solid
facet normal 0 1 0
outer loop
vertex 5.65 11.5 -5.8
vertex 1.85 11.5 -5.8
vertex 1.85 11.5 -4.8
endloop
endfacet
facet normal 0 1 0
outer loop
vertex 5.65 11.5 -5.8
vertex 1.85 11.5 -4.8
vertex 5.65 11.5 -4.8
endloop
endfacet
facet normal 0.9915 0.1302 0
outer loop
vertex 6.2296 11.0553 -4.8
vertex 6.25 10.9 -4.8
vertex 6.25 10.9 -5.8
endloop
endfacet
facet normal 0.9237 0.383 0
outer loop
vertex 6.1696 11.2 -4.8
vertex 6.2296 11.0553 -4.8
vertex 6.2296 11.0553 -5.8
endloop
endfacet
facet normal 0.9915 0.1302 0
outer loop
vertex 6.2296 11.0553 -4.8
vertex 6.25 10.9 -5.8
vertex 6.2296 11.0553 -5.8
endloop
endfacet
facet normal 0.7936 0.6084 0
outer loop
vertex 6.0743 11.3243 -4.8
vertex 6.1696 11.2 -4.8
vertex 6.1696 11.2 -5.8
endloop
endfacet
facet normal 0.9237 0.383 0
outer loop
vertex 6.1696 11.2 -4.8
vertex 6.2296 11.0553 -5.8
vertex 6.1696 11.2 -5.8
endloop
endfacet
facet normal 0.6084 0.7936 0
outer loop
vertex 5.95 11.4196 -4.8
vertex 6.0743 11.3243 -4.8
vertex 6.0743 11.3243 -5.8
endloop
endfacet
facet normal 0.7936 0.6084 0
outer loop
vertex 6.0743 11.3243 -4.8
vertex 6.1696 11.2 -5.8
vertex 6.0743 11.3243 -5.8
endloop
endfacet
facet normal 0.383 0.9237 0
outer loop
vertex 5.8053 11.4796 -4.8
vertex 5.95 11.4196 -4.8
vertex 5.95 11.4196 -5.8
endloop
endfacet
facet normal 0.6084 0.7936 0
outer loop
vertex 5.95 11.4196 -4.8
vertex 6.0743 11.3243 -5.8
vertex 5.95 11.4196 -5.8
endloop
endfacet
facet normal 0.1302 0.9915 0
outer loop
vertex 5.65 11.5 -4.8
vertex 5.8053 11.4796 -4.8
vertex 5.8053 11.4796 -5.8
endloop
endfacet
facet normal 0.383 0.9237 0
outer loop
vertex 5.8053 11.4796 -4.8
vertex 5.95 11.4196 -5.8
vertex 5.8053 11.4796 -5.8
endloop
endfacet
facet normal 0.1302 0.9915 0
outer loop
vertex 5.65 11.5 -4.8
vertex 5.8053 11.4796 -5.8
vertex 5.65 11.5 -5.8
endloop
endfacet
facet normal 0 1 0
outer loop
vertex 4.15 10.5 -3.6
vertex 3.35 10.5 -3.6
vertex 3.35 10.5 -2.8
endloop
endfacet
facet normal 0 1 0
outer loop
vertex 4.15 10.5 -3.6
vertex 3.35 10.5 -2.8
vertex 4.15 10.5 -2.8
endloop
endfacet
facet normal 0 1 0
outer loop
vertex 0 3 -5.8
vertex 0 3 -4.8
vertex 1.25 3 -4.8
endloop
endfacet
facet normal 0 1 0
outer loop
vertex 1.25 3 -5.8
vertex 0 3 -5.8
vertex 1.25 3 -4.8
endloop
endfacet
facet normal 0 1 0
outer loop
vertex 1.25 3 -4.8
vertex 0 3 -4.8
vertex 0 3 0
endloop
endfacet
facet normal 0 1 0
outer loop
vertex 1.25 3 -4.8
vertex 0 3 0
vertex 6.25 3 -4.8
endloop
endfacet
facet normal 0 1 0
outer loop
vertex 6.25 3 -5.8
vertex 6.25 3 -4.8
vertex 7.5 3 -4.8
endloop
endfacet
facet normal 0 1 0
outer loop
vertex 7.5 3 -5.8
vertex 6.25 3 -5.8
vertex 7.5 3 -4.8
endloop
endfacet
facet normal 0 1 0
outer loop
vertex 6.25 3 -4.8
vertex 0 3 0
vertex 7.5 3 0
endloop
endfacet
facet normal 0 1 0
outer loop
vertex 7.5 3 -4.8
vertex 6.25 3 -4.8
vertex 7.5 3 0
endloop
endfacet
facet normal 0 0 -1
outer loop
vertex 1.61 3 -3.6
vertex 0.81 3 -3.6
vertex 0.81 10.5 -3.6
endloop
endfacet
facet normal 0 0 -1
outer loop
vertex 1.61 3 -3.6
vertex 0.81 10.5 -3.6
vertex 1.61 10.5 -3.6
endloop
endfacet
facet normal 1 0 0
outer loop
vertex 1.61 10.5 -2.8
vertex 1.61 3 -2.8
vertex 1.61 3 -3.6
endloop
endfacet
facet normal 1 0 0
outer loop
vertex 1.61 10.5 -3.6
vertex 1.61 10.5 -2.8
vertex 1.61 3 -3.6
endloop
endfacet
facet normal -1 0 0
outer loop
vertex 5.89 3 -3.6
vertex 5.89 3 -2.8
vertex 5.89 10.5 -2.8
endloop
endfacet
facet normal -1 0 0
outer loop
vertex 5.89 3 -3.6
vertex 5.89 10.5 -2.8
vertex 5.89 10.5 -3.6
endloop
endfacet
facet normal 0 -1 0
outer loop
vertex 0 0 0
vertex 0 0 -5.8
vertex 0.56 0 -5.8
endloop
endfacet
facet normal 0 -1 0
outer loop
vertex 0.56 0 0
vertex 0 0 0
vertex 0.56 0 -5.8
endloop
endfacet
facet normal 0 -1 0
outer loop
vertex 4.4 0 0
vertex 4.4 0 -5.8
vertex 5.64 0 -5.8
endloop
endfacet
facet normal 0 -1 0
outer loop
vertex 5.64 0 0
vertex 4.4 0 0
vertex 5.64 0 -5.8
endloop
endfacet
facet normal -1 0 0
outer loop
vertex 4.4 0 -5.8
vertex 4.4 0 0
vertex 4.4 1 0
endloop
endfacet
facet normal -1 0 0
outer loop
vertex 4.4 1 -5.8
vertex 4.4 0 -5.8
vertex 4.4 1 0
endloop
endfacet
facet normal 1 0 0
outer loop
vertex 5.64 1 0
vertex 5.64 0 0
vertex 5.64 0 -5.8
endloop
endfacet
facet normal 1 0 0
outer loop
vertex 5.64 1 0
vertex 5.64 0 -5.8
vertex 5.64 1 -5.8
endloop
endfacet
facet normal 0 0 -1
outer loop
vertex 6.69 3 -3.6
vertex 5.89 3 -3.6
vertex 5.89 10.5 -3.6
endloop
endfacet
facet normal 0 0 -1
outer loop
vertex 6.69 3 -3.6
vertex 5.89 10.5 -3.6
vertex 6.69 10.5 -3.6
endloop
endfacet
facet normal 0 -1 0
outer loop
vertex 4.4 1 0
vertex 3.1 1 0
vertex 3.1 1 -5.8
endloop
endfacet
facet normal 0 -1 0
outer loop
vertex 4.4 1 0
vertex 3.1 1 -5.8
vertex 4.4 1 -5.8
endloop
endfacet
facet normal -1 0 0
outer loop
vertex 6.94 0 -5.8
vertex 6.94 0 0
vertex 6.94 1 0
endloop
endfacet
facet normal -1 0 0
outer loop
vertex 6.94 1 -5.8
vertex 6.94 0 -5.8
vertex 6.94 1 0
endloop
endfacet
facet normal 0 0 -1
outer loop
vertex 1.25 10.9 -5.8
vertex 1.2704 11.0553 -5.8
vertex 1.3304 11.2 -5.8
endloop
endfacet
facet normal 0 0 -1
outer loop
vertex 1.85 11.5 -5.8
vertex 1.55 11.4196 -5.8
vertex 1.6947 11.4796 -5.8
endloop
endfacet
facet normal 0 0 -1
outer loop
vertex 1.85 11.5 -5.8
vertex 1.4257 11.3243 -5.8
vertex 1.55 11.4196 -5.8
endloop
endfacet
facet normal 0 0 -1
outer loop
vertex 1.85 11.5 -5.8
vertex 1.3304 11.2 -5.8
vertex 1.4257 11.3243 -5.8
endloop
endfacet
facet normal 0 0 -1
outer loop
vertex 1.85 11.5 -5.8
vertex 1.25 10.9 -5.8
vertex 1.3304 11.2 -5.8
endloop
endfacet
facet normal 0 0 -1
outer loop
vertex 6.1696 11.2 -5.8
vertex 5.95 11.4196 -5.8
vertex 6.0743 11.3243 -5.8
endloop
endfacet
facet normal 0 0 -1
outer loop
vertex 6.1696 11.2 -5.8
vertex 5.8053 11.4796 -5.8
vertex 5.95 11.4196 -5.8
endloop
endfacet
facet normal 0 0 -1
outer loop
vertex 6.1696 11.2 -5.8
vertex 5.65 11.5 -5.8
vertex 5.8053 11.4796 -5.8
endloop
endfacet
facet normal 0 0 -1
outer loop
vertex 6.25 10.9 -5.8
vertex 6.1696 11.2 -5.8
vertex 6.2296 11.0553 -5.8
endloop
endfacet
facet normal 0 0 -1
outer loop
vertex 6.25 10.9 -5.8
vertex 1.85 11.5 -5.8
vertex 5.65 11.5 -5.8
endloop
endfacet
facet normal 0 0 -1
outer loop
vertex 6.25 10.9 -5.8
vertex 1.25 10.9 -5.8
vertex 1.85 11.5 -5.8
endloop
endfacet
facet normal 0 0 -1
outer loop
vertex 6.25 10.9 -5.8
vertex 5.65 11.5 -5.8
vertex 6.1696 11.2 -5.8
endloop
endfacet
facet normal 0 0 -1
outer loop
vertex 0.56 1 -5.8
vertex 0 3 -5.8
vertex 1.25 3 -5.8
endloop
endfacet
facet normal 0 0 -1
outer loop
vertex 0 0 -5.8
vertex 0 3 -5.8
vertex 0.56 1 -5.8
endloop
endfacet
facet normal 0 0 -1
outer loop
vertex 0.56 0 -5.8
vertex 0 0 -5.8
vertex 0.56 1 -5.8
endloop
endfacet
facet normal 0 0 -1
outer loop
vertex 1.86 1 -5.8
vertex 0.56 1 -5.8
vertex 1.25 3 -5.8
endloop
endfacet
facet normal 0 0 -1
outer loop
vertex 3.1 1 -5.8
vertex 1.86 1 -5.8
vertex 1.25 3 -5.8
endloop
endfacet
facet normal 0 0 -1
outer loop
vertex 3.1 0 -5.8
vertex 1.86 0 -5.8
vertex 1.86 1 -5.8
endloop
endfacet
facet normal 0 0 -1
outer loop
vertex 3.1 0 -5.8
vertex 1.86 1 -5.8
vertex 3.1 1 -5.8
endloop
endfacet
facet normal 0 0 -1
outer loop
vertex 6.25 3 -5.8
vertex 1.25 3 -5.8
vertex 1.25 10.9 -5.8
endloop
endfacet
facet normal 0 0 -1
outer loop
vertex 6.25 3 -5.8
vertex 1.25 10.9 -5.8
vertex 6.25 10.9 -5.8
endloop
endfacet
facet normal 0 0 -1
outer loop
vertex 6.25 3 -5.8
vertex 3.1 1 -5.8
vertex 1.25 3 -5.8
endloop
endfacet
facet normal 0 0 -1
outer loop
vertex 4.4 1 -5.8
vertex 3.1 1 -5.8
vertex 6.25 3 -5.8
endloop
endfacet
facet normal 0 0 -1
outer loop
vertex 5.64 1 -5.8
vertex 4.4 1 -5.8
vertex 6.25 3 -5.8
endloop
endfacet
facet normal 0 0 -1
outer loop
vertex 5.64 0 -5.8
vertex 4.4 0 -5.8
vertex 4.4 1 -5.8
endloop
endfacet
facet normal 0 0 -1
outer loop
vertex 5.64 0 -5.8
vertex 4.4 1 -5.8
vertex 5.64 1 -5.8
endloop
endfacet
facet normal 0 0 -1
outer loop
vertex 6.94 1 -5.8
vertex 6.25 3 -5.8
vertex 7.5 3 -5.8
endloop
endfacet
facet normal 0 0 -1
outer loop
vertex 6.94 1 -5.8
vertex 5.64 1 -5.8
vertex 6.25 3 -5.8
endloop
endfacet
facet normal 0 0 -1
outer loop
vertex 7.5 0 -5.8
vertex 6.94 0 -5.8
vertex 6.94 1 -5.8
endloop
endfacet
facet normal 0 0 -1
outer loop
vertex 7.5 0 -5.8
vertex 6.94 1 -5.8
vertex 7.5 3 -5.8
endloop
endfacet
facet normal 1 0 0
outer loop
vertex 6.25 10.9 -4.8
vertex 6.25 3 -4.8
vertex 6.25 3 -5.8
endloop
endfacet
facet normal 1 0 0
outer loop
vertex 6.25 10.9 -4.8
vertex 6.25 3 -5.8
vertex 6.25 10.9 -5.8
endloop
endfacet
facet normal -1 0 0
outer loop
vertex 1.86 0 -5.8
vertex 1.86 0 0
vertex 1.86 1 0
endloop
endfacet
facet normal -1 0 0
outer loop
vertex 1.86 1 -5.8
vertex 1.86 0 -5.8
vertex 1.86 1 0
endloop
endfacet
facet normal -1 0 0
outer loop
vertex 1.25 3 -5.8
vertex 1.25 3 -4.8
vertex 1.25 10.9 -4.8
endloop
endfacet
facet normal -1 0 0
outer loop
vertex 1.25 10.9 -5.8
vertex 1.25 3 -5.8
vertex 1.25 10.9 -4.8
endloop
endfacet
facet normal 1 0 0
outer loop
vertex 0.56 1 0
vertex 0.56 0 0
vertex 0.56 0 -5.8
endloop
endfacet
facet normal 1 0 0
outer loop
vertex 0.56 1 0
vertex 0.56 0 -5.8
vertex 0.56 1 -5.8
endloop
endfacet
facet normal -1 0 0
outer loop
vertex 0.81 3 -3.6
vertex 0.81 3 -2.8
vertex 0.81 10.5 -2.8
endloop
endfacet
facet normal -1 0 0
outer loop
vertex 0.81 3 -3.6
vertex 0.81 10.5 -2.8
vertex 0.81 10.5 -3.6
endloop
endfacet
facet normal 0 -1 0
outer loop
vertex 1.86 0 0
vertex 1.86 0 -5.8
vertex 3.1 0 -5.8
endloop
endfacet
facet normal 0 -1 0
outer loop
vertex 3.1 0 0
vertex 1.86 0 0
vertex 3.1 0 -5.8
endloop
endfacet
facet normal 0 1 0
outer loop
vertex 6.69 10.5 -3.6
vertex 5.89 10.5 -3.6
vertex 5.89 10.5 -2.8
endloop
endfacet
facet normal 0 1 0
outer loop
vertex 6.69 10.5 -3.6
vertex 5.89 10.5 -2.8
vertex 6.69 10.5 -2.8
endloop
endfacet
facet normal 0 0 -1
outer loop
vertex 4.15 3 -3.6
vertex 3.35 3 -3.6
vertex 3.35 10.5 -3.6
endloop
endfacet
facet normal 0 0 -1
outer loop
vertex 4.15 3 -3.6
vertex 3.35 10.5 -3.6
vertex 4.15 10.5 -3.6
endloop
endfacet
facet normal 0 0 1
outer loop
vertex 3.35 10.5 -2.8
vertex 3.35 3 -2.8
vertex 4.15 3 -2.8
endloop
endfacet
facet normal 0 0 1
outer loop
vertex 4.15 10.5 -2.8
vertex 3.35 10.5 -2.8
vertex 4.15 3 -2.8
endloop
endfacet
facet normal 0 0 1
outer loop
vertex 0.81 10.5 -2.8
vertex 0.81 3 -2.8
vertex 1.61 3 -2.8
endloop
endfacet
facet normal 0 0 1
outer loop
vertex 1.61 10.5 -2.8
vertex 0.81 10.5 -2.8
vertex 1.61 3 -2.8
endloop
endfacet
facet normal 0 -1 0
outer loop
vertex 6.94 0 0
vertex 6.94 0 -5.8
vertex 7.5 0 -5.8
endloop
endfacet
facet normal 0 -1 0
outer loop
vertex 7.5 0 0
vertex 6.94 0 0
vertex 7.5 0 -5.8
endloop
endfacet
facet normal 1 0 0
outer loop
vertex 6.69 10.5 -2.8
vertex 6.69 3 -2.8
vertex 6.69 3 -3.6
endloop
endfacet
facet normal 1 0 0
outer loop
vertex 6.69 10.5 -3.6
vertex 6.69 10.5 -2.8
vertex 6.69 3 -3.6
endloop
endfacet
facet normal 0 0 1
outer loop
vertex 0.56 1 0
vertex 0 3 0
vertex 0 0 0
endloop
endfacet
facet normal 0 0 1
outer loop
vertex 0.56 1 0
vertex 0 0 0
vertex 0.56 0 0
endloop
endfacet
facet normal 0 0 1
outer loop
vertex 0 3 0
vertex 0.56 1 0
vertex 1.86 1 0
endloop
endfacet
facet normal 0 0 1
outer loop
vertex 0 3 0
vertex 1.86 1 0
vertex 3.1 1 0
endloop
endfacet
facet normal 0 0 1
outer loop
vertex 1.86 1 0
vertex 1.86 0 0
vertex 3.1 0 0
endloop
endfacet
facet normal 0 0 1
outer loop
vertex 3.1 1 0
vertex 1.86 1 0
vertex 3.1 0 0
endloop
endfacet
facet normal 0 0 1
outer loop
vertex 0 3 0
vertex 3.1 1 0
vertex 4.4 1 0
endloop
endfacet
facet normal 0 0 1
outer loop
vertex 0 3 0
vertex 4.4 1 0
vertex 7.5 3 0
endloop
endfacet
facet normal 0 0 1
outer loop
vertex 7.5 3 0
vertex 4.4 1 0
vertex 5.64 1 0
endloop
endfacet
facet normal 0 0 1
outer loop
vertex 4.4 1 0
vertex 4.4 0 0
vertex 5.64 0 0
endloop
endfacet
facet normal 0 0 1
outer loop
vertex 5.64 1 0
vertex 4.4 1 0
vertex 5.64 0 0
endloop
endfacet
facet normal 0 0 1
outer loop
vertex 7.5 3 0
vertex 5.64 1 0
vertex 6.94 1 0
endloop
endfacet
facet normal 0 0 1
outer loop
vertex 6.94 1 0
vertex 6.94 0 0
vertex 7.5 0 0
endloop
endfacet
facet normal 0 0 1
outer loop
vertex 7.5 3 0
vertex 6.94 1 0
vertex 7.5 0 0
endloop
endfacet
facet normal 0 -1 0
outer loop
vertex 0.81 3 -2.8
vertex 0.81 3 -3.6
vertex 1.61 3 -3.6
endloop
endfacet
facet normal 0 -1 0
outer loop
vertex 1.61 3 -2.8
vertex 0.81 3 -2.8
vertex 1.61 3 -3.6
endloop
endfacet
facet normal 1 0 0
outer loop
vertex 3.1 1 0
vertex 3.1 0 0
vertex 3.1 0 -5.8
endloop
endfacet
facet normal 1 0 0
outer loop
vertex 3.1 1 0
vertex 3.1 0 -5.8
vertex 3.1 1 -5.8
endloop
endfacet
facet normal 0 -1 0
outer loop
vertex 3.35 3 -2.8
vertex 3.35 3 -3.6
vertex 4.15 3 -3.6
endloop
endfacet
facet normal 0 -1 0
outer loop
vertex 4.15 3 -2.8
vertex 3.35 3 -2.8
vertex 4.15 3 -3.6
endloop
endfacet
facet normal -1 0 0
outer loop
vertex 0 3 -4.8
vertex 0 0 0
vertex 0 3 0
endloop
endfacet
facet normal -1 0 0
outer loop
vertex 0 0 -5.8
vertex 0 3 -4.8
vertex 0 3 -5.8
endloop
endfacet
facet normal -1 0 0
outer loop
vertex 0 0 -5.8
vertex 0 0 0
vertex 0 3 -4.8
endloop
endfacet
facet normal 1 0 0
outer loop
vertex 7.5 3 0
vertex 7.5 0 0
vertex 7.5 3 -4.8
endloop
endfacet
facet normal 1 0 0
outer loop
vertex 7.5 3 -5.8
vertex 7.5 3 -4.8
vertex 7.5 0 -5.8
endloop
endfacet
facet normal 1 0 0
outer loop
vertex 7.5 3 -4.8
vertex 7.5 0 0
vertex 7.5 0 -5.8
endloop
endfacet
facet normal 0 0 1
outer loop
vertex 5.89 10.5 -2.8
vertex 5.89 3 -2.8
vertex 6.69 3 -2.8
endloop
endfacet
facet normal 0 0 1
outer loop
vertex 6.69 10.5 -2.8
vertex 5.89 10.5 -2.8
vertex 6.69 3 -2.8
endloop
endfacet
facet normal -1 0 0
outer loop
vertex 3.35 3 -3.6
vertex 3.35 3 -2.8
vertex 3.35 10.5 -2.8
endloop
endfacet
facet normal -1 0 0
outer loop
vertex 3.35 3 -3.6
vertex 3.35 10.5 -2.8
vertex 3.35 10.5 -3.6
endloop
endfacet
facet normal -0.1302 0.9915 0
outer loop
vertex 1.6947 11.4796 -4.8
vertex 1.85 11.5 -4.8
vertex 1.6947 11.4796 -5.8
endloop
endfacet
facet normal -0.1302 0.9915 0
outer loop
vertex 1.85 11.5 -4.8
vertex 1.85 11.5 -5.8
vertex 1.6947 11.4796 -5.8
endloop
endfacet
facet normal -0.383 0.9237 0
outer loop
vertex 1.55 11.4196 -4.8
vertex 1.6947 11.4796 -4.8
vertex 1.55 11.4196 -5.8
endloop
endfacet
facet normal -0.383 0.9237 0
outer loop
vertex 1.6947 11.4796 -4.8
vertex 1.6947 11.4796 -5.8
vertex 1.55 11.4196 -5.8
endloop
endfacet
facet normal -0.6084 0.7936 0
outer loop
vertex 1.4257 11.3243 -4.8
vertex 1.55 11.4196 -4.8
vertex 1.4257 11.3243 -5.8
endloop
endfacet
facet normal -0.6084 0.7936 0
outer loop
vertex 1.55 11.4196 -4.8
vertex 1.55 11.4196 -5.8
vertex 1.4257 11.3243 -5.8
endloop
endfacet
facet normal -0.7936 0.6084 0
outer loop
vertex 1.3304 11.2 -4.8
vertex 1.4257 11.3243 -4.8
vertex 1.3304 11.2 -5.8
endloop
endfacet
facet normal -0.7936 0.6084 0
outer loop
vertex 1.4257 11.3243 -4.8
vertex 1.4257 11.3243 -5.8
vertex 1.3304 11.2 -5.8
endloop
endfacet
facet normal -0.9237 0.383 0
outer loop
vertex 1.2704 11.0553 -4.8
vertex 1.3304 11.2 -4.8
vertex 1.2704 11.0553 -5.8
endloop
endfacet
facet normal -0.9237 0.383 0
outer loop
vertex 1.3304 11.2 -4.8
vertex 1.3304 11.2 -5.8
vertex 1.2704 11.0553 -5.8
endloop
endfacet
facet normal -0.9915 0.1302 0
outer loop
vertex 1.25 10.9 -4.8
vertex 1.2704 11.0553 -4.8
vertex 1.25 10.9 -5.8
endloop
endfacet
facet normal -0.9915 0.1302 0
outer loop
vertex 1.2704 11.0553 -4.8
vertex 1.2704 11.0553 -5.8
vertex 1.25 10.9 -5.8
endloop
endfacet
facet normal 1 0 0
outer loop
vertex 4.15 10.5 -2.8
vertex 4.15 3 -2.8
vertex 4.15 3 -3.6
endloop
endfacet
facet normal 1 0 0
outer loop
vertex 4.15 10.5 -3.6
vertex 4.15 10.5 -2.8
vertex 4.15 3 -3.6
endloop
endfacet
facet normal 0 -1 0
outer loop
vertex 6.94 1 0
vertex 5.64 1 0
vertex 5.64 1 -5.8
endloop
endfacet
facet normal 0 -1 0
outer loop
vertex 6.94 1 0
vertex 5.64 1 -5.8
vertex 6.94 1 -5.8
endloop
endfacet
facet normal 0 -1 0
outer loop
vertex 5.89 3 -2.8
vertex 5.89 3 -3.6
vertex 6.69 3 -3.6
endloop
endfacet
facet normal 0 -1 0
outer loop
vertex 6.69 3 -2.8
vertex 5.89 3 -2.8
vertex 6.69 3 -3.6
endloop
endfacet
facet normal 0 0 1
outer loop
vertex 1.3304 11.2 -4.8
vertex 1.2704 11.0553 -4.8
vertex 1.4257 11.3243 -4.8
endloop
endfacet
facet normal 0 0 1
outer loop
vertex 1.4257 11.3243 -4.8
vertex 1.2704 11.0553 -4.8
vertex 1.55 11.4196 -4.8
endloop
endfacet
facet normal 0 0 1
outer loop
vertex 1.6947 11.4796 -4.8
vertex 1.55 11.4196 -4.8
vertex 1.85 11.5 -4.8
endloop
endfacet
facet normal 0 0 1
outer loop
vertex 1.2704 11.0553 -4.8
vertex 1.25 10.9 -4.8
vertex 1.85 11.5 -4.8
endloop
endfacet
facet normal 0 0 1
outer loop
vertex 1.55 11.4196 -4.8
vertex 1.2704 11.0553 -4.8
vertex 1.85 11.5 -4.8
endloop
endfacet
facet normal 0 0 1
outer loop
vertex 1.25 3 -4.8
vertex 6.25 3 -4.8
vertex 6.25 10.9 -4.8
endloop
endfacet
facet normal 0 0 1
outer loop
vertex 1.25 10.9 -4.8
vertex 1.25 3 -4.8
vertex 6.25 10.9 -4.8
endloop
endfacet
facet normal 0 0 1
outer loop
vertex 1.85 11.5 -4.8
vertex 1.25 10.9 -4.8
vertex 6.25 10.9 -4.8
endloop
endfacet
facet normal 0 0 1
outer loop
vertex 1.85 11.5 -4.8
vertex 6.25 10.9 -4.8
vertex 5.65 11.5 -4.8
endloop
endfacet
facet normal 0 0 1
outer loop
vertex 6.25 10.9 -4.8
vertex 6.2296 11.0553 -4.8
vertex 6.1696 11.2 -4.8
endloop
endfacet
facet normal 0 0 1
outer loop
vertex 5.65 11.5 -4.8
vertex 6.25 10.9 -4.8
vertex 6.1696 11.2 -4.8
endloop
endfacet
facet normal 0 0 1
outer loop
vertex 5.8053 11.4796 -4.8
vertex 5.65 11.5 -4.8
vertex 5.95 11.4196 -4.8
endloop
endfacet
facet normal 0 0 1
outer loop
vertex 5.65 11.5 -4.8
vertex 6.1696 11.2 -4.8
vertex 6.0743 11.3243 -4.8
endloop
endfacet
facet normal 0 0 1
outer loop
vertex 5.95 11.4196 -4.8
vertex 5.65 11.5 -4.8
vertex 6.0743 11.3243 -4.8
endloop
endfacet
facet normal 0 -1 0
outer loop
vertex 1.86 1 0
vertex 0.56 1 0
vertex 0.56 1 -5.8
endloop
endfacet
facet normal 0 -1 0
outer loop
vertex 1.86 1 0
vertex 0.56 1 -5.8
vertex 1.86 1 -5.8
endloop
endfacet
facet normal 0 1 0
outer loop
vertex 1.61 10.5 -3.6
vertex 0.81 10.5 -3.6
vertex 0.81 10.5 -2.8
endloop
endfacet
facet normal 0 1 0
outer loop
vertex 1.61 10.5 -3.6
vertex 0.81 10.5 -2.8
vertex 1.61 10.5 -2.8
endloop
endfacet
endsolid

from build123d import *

# Parameters (mm, degrees)
CROQUIS1_W            = 7.5
CROQUIS1_H            = 5.8
EXTRUIR1_DEPTH        = 11.5
CROQUIS2_W            = 6.137919575
CROQUIS2_H            = 10.958568738
CORTAR_EXTRUIR1_DEPTH = 11.5
CROQUIS3_W            = 2.217883387
CROQUIS3_H            = 8.857556959
CROQUIS3_W_2          = 2.732635427
CORTAR_EXTRUIR2_DEPTH = 11.5
REDONDEO1_R           = 0.6
CROQUIS4_W            = 0.8
CROQUIS4_H            = 0.8
EXTRUIR2_DEPTH        = 7.5
EXTRUIR2_2_DEPTH      = 7.5
EXTRUIR2_3_DEPTH      = 7.5
CROQUIS5_W            = 1.3
CROQUIS5_H            = 1.427624534
CORTAR_EXTRUIR3_DEPTH = 7.5


with BuildPart() as part:
    # Croquis1 → Extruir1 (new body)
    with BuildSketch(Plane(origin=(0, 0, 0), x_dir=(1, 0, 0), z_dir=(0, 1, 0))):
        with Locations((3.75, 2.9)):
            Rectangle(CROQUIS1_W, CROQUIS1_H)
    extrude(amount=EXTRUIR1_DEPTH)

    # Croquis2 → Cortar-Extruir1 (cut)
    with BuildSketch(Plane(origin=(7.5, 0, 0), x_dir=(0, 0, -1), z_dir=(1, 0, 0))):
        with Locations((1.731040213, 8.479284369)):
            Rectangle(CROQUIS2_W, CROQUIS2_H)
    extrude(amount=-CORTAR_EXTRUIR1_DEPTH, mode=Mode.SUBTRACT)

    # Croquis3 → Cortar-Extruir2 (cut)
    with BuildSketch(Plane.XY.offset(-4.8)):
        with Locations((0.141058306, 7.42877848)):
            Rectangle(CROQUIS3_W, CROQUIS3_H)
        with Locations((7.616317713, 7.42877848)):
            Rectangle(CROQUIS3_W_2, CROQUIS3_H)
    extrude(amount=-CORTAR_EXTRUIR2_DEPTH, mode=Mode.SUBTRACT)

    # Redondeo1
    redondeo1_edges = [part.edges().sort_by_distance(p)[0] for p in [
        (1.25, 11.5, -5.3),
        (6.25, 11.5, -5.3),
    ]]
    fillet(redondeo1_edges, radius=REDONDEO1_R)

    # Croquis5 → Cortar-Extruir3 (cut)
    with BuildSketch(Plane.XY):
        with Locations((3.75, 0.286187733)):
            Rectangle(CROQUIS5_W, CROQUIS5_H)
        with Locations((6.29, 0.286187733)):
            Rectangle(CROQUIS5_W, CROQUIS5_H)
        with Locations((1.21, 0.286187733)):
            Rectangle(CROQUIS5_W, CROQUIS5_H)
    extrude(amount=-CORTAR_EXTRUIR3_DEPTH, mode=Mode.SUBTRACT)


with BuildPart() as body_2:
    # Croquis4 → Extruir2 (new body)
    with BuildSketch(Plane(origin=(0, 3, 0), x_dir=(1, 0, 0), z_dir=(0, 1, 0))):
        with Locations((3.75, 3.2)):
            Rectangle(CROQUIS4_W, CROQUIS4_H)
    extrude(amount=EXTRUIR2_DEPTH)


with BuildPart() as body_3:
    # Croquis4 → Extruir2 2 (new body)
    with BuildSketch(Plane(origin=(0, 3, 0), x_dir=(1, 0, 0), z_dir=(0, 1, 0))):
        with Locations((6.29, 3.2)):
            Rectangle(CROQUIS4_W, CROQUIS4_H)
    extrude(amount=EXTRUIR2_2_DEPTH)


with BuildPart() as body_4:
    # Croquis4 → Extruir2 3 (new body)
    with BuildSketch(Plane(origin=(0, 3, 0), x_dir=(1, 0, 0), z_dir=(0, 1, 0))):
        with Locations((1.21, 3.2)):
            Rectangle(CROQUIS4_W, CROQUIS4_H)
    extrude(amount=EXTRUIR2_3_DEPTH)


solid = Compound([part.part, body_2.part, body_3.part, body_4.part])
